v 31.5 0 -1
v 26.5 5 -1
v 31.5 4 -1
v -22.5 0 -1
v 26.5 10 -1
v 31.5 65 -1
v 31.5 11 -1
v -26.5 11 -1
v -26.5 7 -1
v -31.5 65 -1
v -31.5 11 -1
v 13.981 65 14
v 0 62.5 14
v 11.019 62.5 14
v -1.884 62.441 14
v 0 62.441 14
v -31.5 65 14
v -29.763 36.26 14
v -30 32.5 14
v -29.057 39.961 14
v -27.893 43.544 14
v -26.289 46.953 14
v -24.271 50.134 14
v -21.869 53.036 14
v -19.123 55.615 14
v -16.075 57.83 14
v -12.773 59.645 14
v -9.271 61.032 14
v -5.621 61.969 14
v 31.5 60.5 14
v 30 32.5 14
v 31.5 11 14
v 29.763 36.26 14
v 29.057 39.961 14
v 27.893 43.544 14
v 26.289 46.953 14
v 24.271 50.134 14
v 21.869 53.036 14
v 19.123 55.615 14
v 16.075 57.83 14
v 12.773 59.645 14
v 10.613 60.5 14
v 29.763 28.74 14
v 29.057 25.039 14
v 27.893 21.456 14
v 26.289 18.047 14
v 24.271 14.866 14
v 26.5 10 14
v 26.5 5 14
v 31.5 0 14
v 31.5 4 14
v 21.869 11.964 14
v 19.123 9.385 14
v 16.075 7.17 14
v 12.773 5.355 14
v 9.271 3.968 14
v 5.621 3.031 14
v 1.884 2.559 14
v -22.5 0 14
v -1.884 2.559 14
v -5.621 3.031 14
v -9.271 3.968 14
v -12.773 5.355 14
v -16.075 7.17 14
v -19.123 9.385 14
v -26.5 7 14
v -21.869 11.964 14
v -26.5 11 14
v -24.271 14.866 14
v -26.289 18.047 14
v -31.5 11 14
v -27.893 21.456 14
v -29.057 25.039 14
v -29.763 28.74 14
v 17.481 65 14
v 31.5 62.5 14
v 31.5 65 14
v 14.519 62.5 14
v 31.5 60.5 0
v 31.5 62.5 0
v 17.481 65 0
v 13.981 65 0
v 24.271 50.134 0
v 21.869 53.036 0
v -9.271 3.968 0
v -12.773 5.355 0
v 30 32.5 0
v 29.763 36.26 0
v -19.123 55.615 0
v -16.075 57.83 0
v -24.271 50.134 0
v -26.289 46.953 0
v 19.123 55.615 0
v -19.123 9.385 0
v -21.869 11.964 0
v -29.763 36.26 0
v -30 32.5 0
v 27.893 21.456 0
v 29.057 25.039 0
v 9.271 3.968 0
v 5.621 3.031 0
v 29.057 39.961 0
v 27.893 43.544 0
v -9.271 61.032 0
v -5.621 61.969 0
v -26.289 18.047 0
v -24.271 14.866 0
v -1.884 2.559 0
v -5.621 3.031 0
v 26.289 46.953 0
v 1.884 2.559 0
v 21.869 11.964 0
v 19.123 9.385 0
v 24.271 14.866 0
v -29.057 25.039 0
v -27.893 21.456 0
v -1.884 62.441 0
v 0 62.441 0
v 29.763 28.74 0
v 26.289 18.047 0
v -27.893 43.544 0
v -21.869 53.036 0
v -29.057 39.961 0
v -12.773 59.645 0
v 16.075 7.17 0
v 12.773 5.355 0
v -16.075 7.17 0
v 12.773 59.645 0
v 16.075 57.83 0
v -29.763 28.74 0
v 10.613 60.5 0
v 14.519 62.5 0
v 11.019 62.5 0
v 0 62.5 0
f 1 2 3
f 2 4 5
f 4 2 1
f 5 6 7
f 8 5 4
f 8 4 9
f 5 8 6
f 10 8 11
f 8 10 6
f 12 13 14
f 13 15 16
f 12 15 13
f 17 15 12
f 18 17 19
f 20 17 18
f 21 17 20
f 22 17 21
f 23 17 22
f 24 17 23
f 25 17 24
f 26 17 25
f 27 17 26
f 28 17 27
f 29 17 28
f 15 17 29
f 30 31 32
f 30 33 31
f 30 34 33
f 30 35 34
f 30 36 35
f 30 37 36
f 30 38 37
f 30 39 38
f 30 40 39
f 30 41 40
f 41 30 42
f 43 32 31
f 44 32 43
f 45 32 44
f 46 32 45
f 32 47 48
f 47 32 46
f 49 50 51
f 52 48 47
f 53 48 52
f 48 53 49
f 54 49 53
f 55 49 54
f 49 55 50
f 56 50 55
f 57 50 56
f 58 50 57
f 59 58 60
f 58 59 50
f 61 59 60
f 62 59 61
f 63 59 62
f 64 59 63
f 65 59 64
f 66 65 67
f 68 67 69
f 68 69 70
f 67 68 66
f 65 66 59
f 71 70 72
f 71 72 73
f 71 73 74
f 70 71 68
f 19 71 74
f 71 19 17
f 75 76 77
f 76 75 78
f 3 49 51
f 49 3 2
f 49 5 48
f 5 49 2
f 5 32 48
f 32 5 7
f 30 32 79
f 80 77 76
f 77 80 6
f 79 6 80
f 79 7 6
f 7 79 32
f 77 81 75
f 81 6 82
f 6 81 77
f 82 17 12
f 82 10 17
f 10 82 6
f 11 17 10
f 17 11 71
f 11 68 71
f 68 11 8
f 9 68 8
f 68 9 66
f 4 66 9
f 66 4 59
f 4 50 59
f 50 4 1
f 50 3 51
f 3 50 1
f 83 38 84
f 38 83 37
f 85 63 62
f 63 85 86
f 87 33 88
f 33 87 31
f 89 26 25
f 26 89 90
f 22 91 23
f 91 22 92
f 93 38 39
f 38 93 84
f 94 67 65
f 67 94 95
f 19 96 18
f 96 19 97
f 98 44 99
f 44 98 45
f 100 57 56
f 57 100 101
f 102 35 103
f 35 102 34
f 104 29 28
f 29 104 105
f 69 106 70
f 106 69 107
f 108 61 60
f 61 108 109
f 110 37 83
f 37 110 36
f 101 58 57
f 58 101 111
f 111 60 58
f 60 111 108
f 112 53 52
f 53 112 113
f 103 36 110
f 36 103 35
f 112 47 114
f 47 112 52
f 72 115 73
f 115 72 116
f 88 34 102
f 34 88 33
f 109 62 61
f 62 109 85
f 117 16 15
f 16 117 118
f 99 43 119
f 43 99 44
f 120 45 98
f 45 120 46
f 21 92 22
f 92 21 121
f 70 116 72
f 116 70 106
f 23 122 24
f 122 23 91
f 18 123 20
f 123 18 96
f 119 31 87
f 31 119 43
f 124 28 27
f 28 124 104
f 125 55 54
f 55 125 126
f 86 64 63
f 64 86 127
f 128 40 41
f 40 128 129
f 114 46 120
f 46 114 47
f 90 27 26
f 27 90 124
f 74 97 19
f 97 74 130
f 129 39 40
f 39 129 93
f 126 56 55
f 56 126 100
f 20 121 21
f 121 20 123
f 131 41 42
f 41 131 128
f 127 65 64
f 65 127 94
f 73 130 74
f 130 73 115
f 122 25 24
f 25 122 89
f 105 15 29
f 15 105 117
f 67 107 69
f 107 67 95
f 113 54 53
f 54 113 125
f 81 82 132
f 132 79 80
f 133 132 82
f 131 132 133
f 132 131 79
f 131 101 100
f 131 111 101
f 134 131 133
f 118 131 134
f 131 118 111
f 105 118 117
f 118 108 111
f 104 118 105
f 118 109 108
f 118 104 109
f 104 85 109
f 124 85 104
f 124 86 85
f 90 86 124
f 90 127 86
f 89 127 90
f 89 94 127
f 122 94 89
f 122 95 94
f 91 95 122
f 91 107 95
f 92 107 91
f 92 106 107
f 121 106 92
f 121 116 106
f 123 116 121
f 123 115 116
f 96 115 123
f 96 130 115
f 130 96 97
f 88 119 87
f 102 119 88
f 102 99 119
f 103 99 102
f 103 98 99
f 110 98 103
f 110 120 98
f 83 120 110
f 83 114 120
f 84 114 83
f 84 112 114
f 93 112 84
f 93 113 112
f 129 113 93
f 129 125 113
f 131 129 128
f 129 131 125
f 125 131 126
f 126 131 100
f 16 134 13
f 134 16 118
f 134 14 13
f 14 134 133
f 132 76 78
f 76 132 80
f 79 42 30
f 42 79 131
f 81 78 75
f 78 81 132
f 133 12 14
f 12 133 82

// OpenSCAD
// Customizable Version of SMD Magazine by robin7331
// https://www.thingiverse.com/thing:3952021

// Another version at Hackaday
// https://hackaday.io/project/169398-modified-smd-tape-magazines

$fn=50;

/* [Dimensions] */
width=15;
gap=2;

/* [Advanced] */


/* [Hidden] */
fudge=0.1;

compliantMag();
module compliantMag(){
  *import("Compliant_SMD_Magazine_15_2.stl");
  
  
  rad=4;
  ovDims=[63,65,width];
  //nodge 
  rghtNodge=[
    [ovDims.x/2,4],
    [ovDims.x/2-5,4+1],
    [ovDims.x/2-5,4+1+5],
    [ovDims.x/2,4+7]
  ];
  
  //hook
  hook=[];
  
  poly=concat([
    [-ovDims.x/2,11],
    [-ovDims.x/2+5,11],
    [-ovDims.x/2+5,11-4],
    [-ovDims.x/2+5+4,0],
    [ovDims.x/2,0]],
    rghtNodge,
    [[ovDims.x/2,ovDims.y],
    [-ovDims.x/2,ovDims.y]
  ]);
  
  minWallThck=2.5;
  d1=22;
  d2=60;
  d3=3;
  
 
  difference(){
    translate([0,0,-1]) linear_extrude(ovDims.z,convexity=2) polygon(poly);
    translate([0,ovDims.y/2,0]) cylinder(d=d2,h=ovDims.z-1+fudge);
    //channel (sketch#2)
      translate([0,ovDims.y-minWallThck-gap,0]) cube([ovDims.x/2+fudge,gap,ovDims.z-1+fudge]);
      translate([ovDims.x/2-14,ovDims.y,0]) 
        linear_extrude(ovDims.z-1+fudge) 
          polygon([[fudge,fudge],[-3.5+fudge,fudge],[-6.5-fudge,-2.5-fudge],[-3-fudge,-2.5-fudge]]);
  }
  /*
  translate([-31.7+d3/2,60.6,-1]) cylinder(d=d3,h=width);
     translate([-27.4-d1/2,50.75,-1-fudge/2]) cylinder(d=d1,h=width+fudge); 
      //center diameter
      translate([0,ovDims.y/2,0]) cylinder(d=d2,h=ovDims.z-1+fudge);
      //channel (sketch#2)
      translate([0,ovDims.y-minWallThck-gap,0]) cube([ovDims.x/2+fudge,gap,ovDims.z-1+fudge]);
      translate([ovDims.x/2-14,ovDims.y,0]) 
        linear_extrude(ovDims.z-1+fudge) 
          polygon([[fudge,fudge],[-3.5+fudge,fudge],[-6.5-fudge,-2.5-fudge],[-3-fudge,-2.5-fudge]]);
      //hook (sketch#3)
      
    }//diff
  */
}

module springMag(){
  %translate([0,32.5,0]) rotate([90,0,0]) %import("SMD_Magazine_v1_-_15-2.0.stl");
}
